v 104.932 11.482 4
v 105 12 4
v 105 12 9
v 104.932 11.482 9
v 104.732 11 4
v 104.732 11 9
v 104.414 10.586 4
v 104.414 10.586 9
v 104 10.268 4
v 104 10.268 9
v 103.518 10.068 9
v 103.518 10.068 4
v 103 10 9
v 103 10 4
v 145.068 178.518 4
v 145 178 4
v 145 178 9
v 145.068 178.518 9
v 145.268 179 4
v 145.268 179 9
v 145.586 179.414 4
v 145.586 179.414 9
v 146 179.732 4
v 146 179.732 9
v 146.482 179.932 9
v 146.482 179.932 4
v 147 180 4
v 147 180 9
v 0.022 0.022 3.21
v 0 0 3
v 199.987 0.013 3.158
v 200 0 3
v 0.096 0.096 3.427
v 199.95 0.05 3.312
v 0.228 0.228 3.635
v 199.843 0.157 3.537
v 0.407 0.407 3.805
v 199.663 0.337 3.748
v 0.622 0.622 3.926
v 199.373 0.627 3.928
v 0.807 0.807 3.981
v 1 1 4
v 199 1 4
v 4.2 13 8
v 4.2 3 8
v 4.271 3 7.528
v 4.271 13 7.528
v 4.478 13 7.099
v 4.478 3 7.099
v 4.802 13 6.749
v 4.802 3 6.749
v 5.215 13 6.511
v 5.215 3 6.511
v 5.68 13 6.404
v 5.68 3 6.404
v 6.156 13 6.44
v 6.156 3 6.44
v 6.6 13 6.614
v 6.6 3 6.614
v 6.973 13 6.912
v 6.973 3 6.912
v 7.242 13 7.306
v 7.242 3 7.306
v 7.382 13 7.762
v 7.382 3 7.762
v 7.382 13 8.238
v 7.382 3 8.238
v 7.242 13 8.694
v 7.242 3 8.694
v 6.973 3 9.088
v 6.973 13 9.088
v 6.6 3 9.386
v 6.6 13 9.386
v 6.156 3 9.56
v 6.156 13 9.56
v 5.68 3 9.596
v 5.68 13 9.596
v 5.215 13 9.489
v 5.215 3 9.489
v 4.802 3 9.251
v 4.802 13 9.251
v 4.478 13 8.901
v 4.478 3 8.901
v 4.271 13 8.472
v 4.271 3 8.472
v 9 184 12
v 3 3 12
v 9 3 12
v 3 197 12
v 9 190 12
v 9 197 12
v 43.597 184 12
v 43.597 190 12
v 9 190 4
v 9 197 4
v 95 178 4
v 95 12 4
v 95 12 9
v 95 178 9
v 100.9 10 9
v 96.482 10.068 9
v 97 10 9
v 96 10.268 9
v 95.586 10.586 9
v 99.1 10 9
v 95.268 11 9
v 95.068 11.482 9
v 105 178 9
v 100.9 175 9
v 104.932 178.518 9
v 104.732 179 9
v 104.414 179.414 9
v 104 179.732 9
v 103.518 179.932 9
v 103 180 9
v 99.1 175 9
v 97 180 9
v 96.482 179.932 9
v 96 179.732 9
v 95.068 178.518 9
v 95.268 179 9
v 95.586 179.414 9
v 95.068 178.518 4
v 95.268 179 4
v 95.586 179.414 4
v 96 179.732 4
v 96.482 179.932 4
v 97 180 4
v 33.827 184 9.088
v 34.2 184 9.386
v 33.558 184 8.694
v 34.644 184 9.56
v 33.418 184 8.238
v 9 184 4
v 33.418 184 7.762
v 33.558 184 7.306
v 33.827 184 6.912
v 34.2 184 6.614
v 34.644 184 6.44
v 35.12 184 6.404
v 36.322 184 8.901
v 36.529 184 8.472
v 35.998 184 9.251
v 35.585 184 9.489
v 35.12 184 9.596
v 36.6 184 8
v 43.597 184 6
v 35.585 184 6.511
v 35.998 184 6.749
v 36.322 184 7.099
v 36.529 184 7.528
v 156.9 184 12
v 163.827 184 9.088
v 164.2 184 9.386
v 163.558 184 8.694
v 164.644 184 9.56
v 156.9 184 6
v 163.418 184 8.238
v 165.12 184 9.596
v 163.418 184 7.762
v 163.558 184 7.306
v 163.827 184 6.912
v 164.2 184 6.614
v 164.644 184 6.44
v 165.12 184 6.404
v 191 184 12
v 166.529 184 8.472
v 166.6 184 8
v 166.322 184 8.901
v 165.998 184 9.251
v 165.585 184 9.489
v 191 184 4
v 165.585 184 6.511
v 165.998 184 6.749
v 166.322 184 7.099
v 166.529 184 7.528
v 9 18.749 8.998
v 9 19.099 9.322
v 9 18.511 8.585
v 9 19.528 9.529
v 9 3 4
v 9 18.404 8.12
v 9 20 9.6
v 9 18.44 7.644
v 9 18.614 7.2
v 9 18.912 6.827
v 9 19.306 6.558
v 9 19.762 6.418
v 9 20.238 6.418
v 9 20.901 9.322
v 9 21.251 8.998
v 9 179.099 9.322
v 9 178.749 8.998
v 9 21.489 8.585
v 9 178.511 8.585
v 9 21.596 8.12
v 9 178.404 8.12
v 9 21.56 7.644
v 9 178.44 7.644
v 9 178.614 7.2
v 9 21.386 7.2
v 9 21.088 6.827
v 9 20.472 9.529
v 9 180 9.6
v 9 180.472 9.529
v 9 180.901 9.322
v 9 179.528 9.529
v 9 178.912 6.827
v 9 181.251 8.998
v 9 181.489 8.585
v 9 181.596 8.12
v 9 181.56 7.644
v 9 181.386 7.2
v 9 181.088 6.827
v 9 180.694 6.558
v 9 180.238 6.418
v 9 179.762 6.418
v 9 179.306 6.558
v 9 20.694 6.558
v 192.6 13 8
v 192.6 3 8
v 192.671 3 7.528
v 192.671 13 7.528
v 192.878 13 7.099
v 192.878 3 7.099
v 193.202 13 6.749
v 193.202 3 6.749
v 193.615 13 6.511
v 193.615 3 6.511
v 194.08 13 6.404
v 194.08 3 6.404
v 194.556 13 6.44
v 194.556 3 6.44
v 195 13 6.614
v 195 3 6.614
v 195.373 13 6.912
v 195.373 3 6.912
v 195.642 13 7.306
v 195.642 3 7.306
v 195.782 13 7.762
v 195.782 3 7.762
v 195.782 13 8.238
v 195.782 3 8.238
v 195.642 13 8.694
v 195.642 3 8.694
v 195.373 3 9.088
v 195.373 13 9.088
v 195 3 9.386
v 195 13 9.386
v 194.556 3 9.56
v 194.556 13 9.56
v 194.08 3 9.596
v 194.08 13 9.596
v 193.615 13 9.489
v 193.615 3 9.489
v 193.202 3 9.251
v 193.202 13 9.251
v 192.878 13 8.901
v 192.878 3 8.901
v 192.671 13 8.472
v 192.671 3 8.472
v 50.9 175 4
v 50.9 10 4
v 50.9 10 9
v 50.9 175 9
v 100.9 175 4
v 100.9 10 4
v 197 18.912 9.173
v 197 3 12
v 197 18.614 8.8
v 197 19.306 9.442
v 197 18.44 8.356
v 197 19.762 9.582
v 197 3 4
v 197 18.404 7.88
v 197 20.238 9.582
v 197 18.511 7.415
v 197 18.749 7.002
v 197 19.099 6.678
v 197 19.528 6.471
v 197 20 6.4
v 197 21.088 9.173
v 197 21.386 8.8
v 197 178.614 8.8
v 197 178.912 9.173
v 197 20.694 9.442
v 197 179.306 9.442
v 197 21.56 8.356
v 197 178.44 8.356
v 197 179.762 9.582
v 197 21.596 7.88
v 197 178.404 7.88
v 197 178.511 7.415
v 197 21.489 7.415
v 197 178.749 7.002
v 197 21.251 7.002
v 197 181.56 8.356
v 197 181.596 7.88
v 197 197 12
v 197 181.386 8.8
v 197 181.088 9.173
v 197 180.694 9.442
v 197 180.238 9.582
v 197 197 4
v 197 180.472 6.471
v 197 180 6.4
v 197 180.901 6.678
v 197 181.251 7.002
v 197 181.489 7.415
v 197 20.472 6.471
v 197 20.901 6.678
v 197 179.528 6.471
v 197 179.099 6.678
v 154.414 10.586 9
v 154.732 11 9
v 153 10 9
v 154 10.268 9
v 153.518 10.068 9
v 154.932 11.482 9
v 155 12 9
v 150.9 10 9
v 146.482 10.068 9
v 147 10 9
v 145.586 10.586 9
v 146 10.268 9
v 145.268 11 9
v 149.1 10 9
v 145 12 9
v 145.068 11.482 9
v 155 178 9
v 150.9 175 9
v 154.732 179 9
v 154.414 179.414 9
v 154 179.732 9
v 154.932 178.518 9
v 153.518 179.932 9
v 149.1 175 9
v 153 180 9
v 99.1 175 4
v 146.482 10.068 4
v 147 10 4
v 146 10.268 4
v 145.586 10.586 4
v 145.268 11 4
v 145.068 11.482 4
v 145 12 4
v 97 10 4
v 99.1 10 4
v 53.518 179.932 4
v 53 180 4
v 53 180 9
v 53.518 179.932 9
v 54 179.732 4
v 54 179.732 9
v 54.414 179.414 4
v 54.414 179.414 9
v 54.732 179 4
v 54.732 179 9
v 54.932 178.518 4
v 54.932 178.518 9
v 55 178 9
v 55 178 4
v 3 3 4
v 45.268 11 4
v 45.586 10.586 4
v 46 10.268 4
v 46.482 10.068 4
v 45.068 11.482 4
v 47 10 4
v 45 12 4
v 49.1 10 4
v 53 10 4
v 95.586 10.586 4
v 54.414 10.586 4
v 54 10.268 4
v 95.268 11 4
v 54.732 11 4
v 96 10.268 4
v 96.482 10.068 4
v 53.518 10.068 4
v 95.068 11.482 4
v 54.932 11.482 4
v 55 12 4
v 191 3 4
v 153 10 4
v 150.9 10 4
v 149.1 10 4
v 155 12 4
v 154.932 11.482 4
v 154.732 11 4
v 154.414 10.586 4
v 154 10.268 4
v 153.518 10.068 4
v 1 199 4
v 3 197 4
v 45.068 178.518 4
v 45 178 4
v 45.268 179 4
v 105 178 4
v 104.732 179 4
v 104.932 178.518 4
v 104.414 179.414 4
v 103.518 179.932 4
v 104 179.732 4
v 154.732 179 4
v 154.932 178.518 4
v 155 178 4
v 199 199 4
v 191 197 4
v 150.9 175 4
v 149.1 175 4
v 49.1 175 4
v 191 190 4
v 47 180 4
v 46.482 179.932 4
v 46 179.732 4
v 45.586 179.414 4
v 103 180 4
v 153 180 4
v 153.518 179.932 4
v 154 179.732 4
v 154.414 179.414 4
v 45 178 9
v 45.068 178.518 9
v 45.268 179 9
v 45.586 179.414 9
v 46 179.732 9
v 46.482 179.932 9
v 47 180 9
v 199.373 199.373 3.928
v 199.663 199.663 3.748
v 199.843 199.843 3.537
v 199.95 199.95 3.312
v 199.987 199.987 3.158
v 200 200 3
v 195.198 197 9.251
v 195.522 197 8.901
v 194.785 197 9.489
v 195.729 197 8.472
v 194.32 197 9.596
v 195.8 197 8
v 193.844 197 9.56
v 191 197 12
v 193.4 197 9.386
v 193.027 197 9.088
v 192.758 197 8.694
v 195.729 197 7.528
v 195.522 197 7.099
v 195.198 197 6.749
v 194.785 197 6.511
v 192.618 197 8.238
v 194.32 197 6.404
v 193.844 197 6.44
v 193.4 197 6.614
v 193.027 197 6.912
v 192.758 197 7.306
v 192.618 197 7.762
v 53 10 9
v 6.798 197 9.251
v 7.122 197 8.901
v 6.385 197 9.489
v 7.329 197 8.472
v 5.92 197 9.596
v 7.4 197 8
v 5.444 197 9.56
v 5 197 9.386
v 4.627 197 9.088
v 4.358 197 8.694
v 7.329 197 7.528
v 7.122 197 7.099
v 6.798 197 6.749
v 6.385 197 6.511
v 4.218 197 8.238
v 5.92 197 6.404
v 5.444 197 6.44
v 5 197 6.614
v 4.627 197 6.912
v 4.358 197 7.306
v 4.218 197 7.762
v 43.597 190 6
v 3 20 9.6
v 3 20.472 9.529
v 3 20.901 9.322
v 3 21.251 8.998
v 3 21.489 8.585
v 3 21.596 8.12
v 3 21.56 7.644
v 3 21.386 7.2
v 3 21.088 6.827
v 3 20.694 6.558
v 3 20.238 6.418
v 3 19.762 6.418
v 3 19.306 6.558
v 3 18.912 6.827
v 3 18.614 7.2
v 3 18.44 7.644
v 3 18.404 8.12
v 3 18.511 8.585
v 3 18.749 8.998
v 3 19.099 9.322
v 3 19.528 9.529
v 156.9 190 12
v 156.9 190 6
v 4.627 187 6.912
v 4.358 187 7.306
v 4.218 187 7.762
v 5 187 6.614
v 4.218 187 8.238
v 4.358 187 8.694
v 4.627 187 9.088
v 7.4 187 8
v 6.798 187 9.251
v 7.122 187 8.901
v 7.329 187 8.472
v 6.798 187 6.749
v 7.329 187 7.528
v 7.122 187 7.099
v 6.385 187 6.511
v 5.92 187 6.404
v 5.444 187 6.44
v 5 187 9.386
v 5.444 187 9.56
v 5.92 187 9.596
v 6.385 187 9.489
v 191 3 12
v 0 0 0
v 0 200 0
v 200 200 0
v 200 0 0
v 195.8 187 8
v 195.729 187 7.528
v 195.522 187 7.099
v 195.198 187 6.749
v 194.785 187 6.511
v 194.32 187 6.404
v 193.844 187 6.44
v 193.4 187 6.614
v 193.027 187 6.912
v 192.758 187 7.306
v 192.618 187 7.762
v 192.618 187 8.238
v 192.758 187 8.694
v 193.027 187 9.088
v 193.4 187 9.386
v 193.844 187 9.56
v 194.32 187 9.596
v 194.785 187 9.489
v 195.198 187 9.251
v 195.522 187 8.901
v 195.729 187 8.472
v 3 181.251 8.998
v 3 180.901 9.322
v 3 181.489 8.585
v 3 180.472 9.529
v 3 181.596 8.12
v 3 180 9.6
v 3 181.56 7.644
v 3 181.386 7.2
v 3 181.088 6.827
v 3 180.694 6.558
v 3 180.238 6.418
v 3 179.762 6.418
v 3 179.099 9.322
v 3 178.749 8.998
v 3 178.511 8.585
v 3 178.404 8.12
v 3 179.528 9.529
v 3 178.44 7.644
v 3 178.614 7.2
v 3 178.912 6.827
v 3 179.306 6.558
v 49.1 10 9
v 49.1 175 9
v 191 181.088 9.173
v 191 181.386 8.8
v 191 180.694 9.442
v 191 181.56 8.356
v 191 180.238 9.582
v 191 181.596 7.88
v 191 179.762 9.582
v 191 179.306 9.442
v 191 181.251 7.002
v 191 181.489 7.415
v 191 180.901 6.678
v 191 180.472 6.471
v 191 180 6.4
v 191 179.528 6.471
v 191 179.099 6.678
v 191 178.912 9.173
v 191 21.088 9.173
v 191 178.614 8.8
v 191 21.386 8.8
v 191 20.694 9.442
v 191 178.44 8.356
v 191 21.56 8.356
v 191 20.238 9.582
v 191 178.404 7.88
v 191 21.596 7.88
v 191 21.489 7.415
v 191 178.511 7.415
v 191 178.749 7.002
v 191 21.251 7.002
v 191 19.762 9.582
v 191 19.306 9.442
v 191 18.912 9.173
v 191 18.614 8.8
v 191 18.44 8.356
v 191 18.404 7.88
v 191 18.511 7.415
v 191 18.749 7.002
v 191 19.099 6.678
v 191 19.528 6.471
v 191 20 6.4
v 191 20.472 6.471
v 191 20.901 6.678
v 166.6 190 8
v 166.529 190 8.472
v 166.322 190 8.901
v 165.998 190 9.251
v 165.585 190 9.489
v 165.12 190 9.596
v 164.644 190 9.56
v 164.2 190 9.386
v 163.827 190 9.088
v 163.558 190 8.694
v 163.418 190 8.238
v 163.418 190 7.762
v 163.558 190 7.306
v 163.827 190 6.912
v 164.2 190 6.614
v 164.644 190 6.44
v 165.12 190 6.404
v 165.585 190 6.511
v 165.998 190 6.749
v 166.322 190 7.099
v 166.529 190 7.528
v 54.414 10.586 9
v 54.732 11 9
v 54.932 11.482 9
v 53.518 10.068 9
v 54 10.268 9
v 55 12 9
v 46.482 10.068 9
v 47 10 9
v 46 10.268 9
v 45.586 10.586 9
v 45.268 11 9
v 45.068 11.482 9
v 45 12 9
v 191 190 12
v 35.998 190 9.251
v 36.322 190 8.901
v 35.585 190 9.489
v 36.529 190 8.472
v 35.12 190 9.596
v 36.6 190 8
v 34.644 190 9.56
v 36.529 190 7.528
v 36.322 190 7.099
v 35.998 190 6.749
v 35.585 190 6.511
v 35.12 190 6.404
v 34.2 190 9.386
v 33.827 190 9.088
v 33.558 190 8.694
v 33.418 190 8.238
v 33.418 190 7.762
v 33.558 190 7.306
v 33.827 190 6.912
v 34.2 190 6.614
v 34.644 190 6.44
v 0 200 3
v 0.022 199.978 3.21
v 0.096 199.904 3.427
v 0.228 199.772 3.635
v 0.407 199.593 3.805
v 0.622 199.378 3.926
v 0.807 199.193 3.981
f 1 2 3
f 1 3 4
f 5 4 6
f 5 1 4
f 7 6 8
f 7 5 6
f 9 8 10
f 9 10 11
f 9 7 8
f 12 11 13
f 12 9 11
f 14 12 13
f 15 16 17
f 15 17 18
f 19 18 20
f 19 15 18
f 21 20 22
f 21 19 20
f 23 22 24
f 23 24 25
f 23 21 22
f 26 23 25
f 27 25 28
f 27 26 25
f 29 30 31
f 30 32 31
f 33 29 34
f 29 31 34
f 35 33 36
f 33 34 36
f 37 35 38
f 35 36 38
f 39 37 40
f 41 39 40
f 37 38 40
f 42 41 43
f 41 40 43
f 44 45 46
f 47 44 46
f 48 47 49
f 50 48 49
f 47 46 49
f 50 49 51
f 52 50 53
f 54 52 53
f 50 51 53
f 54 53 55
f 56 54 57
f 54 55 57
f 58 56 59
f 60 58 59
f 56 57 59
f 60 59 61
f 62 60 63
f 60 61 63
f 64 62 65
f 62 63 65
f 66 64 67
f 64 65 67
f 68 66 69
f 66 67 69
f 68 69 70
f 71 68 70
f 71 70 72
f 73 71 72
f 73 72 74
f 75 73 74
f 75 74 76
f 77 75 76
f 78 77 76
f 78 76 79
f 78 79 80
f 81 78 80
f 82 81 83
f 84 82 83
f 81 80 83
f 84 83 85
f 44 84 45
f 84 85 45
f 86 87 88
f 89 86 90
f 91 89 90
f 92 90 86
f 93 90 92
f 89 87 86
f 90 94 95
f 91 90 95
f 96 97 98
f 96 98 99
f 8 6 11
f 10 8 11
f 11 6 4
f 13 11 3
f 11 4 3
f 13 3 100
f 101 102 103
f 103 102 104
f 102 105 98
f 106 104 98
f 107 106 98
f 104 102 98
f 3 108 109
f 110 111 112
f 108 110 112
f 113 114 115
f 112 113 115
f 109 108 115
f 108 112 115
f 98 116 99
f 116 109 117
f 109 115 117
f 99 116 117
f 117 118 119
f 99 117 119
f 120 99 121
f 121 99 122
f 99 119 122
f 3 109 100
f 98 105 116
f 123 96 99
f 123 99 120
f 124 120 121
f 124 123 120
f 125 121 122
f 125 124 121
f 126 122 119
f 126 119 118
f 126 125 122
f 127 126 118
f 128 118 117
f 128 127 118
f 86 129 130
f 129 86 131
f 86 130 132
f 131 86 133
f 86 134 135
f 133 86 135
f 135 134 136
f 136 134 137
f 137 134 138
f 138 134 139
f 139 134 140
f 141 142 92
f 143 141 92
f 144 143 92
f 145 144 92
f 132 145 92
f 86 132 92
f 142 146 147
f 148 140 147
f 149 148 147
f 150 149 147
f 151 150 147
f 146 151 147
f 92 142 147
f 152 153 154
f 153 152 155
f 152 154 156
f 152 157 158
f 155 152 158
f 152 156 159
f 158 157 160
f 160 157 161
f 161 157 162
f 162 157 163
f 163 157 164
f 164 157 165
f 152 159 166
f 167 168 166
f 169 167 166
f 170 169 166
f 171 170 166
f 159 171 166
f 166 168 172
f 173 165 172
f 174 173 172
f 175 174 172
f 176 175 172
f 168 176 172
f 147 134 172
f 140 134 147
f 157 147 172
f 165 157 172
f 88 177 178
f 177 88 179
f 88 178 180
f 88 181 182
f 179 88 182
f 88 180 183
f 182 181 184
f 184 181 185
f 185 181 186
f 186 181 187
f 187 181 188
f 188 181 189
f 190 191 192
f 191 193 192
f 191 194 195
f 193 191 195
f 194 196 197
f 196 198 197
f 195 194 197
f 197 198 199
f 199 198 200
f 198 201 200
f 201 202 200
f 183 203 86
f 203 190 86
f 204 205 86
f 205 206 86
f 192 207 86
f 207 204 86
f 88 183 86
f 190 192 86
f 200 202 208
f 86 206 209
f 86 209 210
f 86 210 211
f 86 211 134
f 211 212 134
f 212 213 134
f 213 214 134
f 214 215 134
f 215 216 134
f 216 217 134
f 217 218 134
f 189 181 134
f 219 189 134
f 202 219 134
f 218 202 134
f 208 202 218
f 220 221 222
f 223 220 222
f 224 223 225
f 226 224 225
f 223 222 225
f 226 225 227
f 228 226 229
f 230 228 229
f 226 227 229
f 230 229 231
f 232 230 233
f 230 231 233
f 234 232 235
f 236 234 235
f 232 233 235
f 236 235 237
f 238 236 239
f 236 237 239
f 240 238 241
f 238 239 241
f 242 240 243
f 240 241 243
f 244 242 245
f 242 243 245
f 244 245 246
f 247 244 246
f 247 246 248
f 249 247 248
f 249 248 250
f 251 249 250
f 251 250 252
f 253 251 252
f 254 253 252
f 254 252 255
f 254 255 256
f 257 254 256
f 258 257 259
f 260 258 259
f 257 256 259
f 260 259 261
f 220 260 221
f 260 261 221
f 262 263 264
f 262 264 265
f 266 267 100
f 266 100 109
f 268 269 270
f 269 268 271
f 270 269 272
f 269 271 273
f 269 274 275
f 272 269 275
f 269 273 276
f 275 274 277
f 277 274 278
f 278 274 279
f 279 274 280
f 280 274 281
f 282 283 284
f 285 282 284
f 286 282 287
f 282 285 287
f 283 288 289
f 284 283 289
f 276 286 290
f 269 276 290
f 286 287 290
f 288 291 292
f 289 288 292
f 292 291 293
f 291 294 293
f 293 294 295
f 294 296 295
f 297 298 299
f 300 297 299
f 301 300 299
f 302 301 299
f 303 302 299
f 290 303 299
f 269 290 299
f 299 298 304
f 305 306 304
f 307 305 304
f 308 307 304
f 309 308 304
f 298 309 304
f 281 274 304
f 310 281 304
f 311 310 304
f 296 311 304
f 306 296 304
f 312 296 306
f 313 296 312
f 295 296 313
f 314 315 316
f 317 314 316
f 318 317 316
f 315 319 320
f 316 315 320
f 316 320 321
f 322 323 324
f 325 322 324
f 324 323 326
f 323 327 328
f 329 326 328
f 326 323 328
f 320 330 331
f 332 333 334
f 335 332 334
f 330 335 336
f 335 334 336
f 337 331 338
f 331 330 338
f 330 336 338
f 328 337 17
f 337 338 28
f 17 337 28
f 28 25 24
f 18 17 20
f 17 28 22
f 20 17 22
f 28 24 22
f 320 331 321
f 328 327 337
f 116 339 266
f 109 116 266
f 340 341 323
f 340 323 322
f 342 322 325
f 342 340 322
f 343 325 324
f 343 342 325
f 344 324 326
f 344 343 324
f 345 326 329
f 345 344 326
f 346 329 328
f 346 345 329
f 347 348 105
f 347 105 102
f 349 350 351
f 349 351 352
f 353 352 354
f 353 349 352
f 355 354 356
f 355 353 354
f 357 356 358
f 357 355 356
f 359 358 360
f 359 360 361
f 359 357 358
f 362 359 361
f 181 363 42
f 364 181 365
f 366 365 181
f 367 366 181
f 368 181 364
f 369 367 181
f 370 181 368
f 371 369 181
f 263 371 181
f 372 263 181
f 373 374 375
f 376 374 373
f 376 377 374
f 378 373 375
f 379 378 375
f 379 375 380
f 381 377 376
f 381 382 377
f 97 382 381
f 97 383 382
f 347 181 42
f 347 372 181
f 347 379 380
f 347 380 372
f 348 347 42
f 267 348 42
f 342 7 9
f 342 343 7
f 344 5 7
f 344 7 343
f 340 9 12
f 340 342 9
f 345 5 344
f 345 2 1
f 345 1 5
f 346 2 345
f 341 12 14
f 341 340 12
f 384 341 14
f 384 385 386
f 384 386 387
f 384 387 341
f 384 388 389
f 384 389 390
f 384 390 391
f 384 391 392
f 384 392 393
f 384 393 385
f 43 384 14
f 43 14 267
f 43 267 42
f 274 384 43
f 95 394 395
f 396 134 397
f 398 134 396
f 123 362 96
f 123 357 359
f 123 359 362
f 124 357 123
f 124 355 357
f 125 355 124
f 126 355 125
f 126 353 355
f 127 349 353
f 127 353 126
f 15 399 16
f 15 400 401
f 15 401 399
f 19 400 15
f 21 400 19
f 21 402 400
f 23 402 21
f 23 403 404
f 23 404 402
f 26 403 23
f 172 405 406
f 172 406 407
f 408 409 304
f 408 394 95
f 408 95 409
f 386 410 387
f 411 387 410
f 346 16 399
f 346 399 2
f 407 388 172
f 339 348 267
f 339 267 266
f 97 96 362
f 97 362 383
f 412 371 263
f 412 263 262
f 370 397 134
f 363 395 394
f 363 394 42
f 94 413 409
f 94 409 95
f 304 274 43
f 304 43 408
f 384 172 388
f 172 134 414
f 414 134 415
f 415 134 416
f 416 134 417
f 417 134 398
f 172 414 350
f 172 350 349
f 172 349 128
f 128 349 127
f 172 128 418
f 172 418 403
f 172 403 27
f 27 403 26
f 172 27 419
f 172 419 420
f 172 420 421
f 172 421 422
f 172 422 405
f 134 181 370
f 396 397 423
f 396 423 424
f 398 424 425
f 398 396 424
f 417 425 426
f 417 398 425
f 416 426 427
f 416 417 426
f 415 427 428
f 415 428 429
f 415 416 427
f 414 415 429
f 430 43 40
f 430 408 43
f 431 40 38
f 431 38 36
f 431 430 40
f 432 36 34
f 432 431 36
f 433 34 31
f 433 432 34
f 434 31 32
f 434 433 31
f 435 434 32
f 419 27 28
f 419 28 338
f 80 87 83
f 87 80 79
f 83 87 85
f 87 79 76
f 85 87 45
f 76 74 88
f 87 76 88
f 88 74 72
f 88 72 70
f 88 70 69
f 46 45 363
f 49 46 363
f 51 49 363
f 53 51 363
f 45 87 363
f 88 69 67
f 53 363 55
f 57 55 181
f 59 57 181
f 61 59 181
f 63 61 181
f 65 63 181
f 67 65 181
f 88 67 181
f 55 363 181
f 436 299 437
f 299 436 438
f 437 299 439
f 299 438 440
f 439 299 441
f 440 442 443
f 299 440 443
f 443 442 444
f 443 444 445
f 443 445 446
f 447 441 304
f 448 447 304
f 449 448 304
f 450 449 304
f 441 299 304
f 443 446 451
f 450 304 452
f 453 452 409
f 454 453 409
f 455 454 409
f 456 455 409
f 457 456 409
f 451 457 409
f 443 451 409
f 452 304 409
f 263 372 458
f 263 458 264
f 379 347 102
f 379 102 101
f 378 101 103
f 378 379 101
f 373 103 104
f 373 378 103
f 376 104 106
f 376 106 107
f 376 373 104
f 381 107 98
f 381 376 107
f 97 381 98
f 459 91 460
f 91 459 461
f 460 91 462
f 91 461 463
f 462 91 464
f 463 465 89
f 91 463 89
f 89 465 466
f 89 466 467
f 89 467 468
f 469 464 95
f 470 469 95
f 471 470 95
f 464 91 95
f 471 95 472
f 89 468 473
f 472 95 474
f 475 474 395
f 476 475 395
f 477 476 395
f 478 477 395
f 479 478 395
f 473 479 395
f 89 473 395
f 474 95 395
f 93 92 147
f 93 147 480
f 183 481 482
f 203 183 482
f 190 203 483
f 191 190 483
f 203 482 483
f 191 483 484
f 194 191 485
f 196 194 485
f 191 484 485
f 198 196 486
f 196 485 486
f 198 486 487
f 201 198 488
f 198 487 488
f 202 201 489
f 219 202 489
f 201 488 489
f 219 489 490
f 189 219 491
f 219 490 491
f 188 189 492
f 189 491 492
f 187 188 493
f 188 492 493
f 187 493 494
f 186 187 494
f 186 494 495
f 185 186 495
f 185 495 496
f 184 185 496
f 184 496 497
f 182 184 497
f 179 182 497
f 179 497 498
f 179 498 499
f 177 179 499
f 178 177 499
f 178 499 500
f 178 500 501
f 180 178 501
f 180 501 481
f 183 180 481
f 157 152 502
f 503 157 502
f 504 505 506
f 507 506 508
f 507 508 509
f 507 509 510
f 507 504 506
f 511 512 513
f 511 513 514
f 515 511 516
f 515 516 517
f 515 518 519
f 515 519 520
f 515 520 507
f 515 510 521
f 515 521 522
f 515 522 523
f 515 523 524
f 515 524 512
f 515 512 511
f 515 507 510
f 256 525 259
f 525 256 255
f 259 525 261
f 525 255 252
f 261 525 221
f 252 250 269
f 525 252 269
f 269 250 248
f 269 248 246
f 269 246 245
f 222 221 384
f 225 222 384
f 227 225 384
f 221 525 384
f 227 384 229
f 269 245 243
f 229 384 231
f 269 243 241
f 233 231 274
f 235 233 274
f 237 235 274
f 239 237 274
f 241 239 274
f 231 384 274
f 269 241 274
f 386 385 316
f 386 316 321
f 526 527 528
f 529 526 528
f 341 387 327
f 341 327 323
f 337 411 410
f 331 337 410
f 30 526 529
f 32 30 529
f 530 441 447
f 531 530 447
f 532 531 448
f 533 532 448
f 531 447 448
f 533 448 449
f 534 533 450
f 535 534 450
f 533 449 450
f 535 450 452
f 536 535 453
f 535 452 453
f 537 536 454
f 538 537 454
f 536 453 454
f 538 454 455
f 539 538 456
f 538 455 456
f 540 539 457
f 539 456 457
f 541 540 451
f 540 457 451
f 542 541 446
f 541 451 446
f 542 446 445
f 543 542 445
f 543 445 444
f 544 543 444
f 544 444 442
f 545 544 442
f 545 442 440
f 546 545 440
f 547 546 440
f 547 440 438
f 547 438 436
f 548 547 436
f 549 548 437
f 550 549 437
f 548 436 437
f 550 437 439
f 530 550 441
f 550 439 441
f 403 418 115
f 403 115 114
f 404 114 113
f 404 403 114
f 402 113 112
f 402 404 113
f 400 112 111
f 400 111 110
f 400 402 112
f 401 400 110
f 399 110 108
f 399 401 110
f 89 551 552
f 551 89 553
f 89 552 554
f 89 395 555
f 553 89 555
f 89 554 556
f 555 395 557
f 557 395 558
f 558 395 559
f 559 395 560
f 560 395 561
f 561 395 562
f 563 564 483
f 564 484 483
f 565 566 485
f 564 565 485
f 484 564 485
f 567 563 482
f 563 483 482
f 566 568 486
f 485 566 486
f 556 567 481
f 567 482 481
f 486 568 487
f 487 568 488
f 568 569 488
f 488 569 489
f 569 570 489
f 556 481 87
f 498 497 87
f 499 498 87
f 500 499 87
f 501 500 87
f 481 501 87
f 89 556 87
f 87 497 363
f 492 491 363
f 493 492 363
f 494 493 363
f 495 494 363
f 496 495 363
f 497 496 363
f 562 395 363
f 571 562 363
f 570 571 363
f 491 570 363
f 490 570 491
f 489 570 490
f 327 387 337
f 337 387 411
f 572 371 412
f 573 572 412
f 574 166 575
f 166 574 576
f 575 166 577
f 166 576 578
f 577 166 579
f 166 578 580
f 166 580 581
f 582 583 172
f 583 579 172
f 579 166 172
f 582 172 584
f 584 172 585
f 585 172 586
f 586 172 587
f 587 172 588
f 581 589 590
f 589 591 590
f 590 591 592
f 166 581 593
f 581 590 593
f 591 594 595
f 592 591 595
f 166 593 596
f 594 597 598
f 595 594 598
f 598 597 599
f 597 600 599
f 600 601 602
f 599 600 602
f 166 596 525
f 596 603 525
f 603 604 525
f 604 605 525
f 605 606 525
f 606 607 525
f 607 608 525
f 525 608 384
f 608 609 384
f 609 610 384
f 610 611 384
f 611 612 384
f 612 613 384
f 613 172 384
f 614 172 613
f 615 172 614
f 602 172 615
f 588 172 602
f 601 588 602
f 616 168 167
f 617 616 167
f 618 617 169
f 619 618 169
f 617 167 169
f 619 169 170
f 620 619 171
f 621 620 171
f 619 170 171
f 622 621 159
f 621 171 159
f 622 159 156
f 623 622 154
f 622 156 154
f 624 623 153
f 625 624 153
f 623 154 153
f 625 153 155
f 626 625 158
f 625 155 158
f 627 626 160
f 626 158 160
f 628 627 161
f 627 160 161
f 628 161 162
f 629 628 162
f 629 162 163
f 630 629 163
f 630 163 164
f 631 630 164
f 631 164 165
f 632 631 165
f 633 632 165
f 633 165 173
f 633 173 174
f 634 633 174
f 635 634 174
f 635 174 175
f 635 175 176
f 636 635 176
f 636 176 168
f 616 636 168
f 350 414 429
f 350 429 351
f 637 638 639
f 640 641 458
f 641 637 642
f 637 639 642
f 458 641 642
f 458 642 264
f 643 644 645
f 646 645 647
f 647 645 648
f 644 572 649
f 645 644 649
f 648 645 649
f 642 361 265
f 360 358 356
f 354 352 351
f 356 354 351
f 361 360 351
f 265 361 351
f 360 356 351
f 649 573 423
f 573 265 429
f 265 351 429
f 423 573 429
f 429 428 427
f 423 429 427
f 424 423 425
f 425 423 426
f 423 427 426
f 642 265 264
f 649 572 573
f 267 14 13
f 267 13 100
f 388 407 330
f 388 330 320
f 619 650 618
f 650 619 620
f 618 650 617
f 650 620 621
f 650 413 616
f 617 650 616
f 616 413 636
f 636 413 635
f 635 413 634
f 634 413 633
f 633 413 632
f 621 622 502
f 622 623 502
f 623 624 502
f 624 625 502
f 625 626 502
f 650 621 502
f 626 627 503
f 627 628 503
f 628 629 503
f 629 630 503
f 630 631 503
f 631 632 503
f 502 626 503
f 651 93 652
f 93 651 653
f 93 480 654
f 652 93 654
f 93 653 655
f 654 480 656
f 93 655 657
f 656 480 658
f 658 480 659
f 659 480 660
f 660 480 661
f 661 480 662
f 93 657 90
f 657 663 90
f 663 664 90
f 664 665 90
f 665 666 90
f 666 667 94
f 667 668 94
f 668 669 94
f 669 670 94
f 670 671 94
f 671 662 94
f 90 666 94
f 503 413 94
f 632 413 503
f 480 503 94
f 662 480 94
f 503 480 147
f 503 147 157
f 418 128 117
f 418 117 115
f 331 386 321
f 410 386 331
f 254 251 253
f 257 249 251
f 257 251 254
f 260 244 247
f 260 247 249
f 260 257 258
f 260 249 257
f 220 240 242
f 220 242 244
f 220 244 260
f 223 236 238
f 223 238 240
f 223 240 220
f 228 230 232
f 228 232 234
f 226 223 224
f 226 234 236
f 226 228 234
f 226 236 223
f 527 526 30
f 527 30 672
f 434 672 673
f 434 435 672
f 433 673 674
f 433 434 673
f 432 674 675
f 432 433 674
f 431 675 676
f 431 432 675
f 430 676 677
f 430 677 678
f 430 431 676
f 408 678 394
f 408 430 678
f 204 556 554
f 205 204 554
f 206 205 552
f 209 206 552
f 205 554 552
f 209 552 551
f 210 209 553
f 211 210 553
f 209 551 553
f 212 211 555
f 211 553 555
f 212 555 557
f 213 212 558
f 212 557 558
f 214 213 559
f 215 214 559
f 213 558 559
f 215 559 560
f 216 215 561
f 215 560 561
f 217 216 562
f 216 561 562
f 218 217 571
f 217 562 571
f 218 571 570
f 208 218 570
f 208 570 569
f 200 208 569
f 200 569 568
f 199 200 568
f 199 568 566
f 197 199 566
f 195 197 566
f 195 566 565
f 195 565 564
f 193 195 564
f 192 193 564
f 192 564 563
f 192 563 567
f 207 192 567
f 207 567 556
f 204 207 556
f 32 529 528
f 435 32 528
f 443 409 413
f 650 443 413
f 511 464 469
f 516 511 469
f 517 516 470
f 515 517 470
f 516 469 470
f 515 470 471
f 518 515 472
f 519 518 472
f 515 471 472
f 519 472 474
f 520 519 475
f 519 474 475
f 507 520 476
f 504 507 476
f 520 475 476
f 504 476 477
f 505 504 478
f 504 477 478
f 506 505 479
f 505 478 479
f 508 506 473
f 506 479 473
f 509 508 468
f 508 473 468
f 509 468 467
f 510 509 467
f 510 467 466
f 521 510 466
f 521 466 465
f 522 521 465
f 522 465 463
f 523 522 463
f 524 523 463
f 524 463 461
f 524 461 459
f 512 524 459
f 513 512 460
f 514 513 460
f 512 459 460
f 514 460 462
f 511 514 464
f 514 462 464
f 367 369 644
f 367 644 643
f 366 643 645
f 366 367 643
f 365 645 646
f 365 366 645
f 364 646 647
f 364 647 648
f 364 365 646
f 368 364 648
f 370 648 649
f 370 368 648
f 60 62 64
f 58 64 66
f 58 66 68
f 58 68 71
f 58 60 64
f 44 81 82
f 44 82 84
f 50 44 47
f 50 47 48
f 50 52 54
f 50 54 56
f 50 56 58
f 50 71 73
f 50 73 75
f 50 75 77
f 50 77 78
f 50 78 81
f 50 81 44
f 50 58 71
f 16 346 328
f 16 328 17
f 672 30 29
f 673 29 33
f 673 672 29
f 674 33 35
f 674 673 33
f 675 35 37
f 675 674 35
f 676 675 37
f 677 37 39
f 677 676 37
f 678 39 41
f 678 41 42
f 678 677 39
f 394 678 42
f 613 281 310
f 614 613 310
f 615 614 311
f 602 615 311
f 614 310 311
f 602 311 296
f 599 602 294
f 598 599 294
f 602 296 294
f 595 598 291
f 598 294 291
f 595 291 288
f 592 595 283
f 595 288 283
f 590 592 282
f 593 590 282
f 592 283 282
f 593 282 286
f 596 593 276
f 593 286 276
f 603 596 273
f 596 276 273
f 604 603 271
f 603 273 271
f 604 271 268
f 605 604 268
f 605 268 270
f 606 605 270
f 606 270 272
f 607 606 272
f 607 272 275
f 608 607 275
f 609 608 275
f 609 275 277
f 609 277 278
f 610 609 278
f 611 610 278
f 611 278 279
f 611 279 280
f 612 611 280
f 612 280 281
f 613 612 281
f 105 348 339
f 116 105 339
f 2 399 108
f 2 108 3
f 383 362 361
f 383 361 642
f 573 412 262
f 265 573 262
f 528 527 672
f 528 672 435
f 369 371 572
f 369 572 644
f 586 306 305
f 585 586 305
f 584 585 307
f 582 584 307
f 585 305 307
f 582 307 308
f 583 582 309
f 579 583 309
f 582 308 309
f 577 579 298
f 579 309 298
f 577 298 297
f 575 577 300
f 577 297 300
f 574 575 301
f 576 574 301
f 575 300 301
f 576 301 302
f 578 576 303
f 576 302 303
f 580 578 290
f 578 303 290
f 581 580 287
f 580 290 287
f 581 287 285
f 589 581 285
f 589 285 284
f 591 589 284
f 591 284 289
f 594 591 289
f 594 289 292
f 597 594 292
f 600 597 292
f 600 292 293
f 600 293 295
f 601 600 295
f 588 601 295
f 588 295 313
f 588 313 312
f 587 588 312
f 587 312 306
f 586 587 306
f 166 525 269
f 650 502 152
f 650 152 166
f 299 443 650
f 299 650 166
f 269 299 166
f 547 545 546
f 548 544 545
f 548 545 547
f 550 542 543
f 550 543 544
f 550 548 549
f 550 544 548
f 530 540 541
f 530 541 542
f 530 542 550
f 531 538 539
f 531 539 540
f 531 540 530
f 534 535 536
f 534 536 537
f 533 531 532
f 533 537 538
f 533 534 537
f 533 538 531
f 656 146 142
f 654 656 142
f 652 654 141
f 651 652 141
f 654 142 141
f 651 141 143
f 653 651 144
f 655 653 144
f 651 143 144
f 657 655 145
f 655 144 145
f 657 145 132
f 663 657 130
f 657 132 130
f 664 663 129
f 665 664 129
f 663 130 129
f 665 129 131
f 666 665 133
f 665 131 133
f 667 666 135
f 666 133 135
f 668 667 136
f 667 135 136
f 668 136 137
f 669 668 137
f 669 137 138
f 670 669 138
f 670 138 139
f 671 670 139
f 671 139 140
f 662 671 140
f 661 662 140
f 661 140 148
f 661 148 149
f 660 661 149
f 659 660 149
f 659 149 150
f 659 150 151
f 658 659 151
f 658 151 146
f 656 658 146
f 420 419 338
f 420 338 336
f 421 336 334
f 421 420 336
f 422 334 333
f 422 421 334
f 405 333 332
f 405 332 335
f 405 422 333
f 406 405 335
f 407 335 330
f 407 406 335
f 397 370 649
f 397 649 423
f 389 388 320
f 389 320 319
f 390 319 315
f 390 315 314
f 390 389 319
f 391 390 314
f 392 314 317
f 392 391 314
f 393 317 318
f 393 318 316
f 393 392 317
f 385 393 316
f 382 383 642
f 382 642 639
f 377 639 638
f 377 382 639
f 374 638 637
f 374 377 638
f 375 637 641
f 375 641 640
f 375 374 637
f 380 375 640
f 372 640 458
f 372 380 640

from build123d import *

# Parameters (mm, degrees)
ESQUISSE1_W                 = 200
ESQUISSE1_H                 = 200
BOSS_EXTRU_PAROIE_DEPTH     = 4
BOSS_EXTRU_BORDS_DEPTH      = 8
BOSS_EXTRU_GLISSIERES_DEPTH = 5
CONG_1_R                    = 1
ESQUISSE8_W                 = 1.8
ESQUISSE8_H                 = 180
ENL_V_MAT_EXTRU_6_DEPTH     = 9
ESQUISSE5_R                 = 1.6
ENL_V_MAT_EXTRU_2_DEPTH     = 10
ESQUISSE6_R                 = 1.6
ENL_V_MAT_EXTRU_3_DEPTH     = 10
ESQUISSE7_R                 = 1.6
ENL_V_MAT_EXTRU_4_DEPTH     = 10
ESQUISSE10_R                = 1.6
ENL_V_MAT_EXTRU_8_DEPTH     = 10
ESQUISSE11_W                = 113.303164178
ESQUISSE11_H                = 6
ENL_V_MAT_EXTRU_9_DEPTH     = 6
ESQUISSE9_R                 = 1.6
ENL_V_MAT_EXTRU_10_DEPTH    = 10


with BuildPart() as part:
    # Esquisse1 → Boss.-Extru. Paroie (new body)
    with BuildSketch(Plane.XY):
        with Locations((100, 100)):
            Rectangle(ESQUISSE1_W, ESQUISSE1_H)
    extrude(amount=BOSS_EXTRU_PAROIE_DEPTH)

    # Esquisse4 → Boss.-Extru. Bords (add)
    with BuildSketch(Plane.XY.offset(4)):
        Polygon((3, 3), (9, 3), (9, 184), (191, 184), (191, 3), (197, 3), (197, 197), (191, 197), (191, 190), (9, 190), (9, 197), (3, 197), align=None)
    extrude(amount=BOSS_EXTRU_BORDS_DEPTH)

    # Esquisse2 → Boss.-Extru. Glissieres (add)
    with BuildSketch(Plane.XY.offset(4)):
        with BuildLine():
            Line((47, 180), (53, 180))
            ThreePointArc((53, 180), (54.414213562, 179.414213562), (55, 178))
            Line((55, 178), (55, 12))
            ThreePointArc((55, 12), (54.414213562, 10.585786438), (53, 10))
            Line((53, 10), (47, 10))
            ThreePointArc((47, 10), (45.585786438, 10.585786438), (45, 12))
            Line((45, 12), (45, 178))
            ThreePointArc((45, 178), (45.585786438, 179.414213562), (47, 180))
        make_face()
        with BuildLine():
            Line((97, 180), (103, 180))
            ThreePointArc((103, 180), (104.414213562, 179.414213562), (105, 178))
            Line((105, 178), (105, 12))
            ThreePointArc((105, 12), (104.414213562, 10.585786438), (103, 10))
            Line((103, 10), (97, 10))
            ThreePointArc((97, 10), (95.585786438, 10.585786438), (95, 12))
            Line((95, 12), (95, 178))
            ThreePointArc((95, 178), (95.585786438, 179.414213562), (97, 180))
        make_face()
        with BuildLine():
            Line((147, 180), (153, 180))
            ThreePointArc((153, 180), (154.414213562, 179.414213562), (155, 178))
            Line((155, 178), (155, 12))
            ThreePointArc((155, 12), (154.414213562, 10.585786438), (153, 10))
            Line((153, 10), (147, 10))
            ThreePointArc((147, 10), (145.585786438, 10.585786438), (145, 12))
            Line((145, 12), (145, 178))
            ThreePointArc((145, 178), (145.585786438, 179.414213562), (147, 180))
        make_face()
    extrude(amount=BOSS_EXTRU_GLISSIERES_DEPTH)

    # Congé1
    cong_1_edges = [part.edges().sort_by_distance(p)[0] for p in [
        (200, 100, 4),
        (100, 200, 4),
        (0, 100, 4),
        (100, 0, 4),
    ]]
    fillet(cong_1_edges, radius=CONG_1_R)

    # Esquisse8 → Enlèv. mat.-Extru.6 (cut, through all)
    with BuildSketch(Plane.XY.offset(4)):
        with Locations((100, 85)):
            Rectangle(ESQUISSE8_W, ESQUISSE8_H)
        with Locations((150, 85)):
            Rectangle(ESQUISSE8_W, ESQUISSE8_H)
        with Locations((50, 85)):
            Rectangle(ESQUISSE8_W, ESQUISSE8_H)
    extrude(amount=ENL_V_MAT_EXTRU_6_DEPTH, mode=Mode.SUBTRACT)

    # Esquisse5 → Enlèv. mat.-Extru.2 (cut)
    with BuildSketch(Plane.ZY.offset(-3)):
        with Locations((8, 180)):
            Circle(ESQUISSE5_R)
        with Locations((8, 20)):
            Circle(ESQUISSE5_R)
    extrude(amount=-ENL_V_MAT_EXTRU_2_DEPTH, mode=Mode.SUBTRACT)

    # Esquisse6 → Enlèv. mat.-Extru.3 (cut)
    with BuildSketch(Plane(origin=(197, 0, 0), x_dir=(0, 0, -1), z_dir=(1, 0, 0))):
        with Locations((-8, 180)):
            Circle(ESQUISSE6_R)
        with Locations((-8, 20)):
            Circle(ESQUISSE6_R)
    extrude(amount=-ENL_V_MAT_EXTRU_3_DEPTH, mode=Mode.SUBTRACT)

    # Esquisse7 → Enlèv. mat.-Extru.4 (cut)
    with BuildSketch(Plane.XZ.offset(-184)):
        with Locations((35, 8)):
            Circle(ESQUISSE7_R)
        with Locations((165, 8)):
            Circle(ESQUISSE7_R)
    extrude(amount=-ENL_V_MAT_EXTRU_4_DEPTH, mode=Mode.SUBTRACT)

    # Esquisse10 → Enlèv. mat.-Extru.8 (cut)
    with BuildSketch(Plane(origin=(0, 3, 0), x_dir=(-1, 0, 0), z_dir=(0, -1, 0))):
        with Locations((-194.2, -8)):
            Circle(ESQUISSE10_R)
        with Locations((-5.8, -8)):
            Circle(ESQUISSE10_R)
    extrude(amount=-ENL_V_MAT_EXTRU_8_DEPTH, mode=Mode.SUBTRACT)

    # Esquisse11 → Enlèv. mat.-Extru.9 (cut)
    with BuildSketch(Plane.XY.offset(12)):
        with Locations((100.248809194, 187)):
            Rectangle(ESQUISSE11_W, ESQUISSE11_H)
    extrude(amount=-ENL_V_MAT_EXTRU_9_DEPTH, mode=Mode.SUBTRACT)

    # Esquisse9 → Enlèv. mat.-Extru.10 (cut)
    with BuildSketch(Plane(origin=(0, 197, 0), x_dir=(1, 0, 0), z_dir=(0, 1, 0))):
        with Locations((194.2, -8)):
            Circle(ESQUISSE9_R)
        with Locations((5.8, -8)):
            Circle(ESQUISSE9_R)
    extrude(amount=-ENL_V_MAT_EXTRU_10_DEPTH, mode=Mode.SUBTRACT)


solid = part.part
